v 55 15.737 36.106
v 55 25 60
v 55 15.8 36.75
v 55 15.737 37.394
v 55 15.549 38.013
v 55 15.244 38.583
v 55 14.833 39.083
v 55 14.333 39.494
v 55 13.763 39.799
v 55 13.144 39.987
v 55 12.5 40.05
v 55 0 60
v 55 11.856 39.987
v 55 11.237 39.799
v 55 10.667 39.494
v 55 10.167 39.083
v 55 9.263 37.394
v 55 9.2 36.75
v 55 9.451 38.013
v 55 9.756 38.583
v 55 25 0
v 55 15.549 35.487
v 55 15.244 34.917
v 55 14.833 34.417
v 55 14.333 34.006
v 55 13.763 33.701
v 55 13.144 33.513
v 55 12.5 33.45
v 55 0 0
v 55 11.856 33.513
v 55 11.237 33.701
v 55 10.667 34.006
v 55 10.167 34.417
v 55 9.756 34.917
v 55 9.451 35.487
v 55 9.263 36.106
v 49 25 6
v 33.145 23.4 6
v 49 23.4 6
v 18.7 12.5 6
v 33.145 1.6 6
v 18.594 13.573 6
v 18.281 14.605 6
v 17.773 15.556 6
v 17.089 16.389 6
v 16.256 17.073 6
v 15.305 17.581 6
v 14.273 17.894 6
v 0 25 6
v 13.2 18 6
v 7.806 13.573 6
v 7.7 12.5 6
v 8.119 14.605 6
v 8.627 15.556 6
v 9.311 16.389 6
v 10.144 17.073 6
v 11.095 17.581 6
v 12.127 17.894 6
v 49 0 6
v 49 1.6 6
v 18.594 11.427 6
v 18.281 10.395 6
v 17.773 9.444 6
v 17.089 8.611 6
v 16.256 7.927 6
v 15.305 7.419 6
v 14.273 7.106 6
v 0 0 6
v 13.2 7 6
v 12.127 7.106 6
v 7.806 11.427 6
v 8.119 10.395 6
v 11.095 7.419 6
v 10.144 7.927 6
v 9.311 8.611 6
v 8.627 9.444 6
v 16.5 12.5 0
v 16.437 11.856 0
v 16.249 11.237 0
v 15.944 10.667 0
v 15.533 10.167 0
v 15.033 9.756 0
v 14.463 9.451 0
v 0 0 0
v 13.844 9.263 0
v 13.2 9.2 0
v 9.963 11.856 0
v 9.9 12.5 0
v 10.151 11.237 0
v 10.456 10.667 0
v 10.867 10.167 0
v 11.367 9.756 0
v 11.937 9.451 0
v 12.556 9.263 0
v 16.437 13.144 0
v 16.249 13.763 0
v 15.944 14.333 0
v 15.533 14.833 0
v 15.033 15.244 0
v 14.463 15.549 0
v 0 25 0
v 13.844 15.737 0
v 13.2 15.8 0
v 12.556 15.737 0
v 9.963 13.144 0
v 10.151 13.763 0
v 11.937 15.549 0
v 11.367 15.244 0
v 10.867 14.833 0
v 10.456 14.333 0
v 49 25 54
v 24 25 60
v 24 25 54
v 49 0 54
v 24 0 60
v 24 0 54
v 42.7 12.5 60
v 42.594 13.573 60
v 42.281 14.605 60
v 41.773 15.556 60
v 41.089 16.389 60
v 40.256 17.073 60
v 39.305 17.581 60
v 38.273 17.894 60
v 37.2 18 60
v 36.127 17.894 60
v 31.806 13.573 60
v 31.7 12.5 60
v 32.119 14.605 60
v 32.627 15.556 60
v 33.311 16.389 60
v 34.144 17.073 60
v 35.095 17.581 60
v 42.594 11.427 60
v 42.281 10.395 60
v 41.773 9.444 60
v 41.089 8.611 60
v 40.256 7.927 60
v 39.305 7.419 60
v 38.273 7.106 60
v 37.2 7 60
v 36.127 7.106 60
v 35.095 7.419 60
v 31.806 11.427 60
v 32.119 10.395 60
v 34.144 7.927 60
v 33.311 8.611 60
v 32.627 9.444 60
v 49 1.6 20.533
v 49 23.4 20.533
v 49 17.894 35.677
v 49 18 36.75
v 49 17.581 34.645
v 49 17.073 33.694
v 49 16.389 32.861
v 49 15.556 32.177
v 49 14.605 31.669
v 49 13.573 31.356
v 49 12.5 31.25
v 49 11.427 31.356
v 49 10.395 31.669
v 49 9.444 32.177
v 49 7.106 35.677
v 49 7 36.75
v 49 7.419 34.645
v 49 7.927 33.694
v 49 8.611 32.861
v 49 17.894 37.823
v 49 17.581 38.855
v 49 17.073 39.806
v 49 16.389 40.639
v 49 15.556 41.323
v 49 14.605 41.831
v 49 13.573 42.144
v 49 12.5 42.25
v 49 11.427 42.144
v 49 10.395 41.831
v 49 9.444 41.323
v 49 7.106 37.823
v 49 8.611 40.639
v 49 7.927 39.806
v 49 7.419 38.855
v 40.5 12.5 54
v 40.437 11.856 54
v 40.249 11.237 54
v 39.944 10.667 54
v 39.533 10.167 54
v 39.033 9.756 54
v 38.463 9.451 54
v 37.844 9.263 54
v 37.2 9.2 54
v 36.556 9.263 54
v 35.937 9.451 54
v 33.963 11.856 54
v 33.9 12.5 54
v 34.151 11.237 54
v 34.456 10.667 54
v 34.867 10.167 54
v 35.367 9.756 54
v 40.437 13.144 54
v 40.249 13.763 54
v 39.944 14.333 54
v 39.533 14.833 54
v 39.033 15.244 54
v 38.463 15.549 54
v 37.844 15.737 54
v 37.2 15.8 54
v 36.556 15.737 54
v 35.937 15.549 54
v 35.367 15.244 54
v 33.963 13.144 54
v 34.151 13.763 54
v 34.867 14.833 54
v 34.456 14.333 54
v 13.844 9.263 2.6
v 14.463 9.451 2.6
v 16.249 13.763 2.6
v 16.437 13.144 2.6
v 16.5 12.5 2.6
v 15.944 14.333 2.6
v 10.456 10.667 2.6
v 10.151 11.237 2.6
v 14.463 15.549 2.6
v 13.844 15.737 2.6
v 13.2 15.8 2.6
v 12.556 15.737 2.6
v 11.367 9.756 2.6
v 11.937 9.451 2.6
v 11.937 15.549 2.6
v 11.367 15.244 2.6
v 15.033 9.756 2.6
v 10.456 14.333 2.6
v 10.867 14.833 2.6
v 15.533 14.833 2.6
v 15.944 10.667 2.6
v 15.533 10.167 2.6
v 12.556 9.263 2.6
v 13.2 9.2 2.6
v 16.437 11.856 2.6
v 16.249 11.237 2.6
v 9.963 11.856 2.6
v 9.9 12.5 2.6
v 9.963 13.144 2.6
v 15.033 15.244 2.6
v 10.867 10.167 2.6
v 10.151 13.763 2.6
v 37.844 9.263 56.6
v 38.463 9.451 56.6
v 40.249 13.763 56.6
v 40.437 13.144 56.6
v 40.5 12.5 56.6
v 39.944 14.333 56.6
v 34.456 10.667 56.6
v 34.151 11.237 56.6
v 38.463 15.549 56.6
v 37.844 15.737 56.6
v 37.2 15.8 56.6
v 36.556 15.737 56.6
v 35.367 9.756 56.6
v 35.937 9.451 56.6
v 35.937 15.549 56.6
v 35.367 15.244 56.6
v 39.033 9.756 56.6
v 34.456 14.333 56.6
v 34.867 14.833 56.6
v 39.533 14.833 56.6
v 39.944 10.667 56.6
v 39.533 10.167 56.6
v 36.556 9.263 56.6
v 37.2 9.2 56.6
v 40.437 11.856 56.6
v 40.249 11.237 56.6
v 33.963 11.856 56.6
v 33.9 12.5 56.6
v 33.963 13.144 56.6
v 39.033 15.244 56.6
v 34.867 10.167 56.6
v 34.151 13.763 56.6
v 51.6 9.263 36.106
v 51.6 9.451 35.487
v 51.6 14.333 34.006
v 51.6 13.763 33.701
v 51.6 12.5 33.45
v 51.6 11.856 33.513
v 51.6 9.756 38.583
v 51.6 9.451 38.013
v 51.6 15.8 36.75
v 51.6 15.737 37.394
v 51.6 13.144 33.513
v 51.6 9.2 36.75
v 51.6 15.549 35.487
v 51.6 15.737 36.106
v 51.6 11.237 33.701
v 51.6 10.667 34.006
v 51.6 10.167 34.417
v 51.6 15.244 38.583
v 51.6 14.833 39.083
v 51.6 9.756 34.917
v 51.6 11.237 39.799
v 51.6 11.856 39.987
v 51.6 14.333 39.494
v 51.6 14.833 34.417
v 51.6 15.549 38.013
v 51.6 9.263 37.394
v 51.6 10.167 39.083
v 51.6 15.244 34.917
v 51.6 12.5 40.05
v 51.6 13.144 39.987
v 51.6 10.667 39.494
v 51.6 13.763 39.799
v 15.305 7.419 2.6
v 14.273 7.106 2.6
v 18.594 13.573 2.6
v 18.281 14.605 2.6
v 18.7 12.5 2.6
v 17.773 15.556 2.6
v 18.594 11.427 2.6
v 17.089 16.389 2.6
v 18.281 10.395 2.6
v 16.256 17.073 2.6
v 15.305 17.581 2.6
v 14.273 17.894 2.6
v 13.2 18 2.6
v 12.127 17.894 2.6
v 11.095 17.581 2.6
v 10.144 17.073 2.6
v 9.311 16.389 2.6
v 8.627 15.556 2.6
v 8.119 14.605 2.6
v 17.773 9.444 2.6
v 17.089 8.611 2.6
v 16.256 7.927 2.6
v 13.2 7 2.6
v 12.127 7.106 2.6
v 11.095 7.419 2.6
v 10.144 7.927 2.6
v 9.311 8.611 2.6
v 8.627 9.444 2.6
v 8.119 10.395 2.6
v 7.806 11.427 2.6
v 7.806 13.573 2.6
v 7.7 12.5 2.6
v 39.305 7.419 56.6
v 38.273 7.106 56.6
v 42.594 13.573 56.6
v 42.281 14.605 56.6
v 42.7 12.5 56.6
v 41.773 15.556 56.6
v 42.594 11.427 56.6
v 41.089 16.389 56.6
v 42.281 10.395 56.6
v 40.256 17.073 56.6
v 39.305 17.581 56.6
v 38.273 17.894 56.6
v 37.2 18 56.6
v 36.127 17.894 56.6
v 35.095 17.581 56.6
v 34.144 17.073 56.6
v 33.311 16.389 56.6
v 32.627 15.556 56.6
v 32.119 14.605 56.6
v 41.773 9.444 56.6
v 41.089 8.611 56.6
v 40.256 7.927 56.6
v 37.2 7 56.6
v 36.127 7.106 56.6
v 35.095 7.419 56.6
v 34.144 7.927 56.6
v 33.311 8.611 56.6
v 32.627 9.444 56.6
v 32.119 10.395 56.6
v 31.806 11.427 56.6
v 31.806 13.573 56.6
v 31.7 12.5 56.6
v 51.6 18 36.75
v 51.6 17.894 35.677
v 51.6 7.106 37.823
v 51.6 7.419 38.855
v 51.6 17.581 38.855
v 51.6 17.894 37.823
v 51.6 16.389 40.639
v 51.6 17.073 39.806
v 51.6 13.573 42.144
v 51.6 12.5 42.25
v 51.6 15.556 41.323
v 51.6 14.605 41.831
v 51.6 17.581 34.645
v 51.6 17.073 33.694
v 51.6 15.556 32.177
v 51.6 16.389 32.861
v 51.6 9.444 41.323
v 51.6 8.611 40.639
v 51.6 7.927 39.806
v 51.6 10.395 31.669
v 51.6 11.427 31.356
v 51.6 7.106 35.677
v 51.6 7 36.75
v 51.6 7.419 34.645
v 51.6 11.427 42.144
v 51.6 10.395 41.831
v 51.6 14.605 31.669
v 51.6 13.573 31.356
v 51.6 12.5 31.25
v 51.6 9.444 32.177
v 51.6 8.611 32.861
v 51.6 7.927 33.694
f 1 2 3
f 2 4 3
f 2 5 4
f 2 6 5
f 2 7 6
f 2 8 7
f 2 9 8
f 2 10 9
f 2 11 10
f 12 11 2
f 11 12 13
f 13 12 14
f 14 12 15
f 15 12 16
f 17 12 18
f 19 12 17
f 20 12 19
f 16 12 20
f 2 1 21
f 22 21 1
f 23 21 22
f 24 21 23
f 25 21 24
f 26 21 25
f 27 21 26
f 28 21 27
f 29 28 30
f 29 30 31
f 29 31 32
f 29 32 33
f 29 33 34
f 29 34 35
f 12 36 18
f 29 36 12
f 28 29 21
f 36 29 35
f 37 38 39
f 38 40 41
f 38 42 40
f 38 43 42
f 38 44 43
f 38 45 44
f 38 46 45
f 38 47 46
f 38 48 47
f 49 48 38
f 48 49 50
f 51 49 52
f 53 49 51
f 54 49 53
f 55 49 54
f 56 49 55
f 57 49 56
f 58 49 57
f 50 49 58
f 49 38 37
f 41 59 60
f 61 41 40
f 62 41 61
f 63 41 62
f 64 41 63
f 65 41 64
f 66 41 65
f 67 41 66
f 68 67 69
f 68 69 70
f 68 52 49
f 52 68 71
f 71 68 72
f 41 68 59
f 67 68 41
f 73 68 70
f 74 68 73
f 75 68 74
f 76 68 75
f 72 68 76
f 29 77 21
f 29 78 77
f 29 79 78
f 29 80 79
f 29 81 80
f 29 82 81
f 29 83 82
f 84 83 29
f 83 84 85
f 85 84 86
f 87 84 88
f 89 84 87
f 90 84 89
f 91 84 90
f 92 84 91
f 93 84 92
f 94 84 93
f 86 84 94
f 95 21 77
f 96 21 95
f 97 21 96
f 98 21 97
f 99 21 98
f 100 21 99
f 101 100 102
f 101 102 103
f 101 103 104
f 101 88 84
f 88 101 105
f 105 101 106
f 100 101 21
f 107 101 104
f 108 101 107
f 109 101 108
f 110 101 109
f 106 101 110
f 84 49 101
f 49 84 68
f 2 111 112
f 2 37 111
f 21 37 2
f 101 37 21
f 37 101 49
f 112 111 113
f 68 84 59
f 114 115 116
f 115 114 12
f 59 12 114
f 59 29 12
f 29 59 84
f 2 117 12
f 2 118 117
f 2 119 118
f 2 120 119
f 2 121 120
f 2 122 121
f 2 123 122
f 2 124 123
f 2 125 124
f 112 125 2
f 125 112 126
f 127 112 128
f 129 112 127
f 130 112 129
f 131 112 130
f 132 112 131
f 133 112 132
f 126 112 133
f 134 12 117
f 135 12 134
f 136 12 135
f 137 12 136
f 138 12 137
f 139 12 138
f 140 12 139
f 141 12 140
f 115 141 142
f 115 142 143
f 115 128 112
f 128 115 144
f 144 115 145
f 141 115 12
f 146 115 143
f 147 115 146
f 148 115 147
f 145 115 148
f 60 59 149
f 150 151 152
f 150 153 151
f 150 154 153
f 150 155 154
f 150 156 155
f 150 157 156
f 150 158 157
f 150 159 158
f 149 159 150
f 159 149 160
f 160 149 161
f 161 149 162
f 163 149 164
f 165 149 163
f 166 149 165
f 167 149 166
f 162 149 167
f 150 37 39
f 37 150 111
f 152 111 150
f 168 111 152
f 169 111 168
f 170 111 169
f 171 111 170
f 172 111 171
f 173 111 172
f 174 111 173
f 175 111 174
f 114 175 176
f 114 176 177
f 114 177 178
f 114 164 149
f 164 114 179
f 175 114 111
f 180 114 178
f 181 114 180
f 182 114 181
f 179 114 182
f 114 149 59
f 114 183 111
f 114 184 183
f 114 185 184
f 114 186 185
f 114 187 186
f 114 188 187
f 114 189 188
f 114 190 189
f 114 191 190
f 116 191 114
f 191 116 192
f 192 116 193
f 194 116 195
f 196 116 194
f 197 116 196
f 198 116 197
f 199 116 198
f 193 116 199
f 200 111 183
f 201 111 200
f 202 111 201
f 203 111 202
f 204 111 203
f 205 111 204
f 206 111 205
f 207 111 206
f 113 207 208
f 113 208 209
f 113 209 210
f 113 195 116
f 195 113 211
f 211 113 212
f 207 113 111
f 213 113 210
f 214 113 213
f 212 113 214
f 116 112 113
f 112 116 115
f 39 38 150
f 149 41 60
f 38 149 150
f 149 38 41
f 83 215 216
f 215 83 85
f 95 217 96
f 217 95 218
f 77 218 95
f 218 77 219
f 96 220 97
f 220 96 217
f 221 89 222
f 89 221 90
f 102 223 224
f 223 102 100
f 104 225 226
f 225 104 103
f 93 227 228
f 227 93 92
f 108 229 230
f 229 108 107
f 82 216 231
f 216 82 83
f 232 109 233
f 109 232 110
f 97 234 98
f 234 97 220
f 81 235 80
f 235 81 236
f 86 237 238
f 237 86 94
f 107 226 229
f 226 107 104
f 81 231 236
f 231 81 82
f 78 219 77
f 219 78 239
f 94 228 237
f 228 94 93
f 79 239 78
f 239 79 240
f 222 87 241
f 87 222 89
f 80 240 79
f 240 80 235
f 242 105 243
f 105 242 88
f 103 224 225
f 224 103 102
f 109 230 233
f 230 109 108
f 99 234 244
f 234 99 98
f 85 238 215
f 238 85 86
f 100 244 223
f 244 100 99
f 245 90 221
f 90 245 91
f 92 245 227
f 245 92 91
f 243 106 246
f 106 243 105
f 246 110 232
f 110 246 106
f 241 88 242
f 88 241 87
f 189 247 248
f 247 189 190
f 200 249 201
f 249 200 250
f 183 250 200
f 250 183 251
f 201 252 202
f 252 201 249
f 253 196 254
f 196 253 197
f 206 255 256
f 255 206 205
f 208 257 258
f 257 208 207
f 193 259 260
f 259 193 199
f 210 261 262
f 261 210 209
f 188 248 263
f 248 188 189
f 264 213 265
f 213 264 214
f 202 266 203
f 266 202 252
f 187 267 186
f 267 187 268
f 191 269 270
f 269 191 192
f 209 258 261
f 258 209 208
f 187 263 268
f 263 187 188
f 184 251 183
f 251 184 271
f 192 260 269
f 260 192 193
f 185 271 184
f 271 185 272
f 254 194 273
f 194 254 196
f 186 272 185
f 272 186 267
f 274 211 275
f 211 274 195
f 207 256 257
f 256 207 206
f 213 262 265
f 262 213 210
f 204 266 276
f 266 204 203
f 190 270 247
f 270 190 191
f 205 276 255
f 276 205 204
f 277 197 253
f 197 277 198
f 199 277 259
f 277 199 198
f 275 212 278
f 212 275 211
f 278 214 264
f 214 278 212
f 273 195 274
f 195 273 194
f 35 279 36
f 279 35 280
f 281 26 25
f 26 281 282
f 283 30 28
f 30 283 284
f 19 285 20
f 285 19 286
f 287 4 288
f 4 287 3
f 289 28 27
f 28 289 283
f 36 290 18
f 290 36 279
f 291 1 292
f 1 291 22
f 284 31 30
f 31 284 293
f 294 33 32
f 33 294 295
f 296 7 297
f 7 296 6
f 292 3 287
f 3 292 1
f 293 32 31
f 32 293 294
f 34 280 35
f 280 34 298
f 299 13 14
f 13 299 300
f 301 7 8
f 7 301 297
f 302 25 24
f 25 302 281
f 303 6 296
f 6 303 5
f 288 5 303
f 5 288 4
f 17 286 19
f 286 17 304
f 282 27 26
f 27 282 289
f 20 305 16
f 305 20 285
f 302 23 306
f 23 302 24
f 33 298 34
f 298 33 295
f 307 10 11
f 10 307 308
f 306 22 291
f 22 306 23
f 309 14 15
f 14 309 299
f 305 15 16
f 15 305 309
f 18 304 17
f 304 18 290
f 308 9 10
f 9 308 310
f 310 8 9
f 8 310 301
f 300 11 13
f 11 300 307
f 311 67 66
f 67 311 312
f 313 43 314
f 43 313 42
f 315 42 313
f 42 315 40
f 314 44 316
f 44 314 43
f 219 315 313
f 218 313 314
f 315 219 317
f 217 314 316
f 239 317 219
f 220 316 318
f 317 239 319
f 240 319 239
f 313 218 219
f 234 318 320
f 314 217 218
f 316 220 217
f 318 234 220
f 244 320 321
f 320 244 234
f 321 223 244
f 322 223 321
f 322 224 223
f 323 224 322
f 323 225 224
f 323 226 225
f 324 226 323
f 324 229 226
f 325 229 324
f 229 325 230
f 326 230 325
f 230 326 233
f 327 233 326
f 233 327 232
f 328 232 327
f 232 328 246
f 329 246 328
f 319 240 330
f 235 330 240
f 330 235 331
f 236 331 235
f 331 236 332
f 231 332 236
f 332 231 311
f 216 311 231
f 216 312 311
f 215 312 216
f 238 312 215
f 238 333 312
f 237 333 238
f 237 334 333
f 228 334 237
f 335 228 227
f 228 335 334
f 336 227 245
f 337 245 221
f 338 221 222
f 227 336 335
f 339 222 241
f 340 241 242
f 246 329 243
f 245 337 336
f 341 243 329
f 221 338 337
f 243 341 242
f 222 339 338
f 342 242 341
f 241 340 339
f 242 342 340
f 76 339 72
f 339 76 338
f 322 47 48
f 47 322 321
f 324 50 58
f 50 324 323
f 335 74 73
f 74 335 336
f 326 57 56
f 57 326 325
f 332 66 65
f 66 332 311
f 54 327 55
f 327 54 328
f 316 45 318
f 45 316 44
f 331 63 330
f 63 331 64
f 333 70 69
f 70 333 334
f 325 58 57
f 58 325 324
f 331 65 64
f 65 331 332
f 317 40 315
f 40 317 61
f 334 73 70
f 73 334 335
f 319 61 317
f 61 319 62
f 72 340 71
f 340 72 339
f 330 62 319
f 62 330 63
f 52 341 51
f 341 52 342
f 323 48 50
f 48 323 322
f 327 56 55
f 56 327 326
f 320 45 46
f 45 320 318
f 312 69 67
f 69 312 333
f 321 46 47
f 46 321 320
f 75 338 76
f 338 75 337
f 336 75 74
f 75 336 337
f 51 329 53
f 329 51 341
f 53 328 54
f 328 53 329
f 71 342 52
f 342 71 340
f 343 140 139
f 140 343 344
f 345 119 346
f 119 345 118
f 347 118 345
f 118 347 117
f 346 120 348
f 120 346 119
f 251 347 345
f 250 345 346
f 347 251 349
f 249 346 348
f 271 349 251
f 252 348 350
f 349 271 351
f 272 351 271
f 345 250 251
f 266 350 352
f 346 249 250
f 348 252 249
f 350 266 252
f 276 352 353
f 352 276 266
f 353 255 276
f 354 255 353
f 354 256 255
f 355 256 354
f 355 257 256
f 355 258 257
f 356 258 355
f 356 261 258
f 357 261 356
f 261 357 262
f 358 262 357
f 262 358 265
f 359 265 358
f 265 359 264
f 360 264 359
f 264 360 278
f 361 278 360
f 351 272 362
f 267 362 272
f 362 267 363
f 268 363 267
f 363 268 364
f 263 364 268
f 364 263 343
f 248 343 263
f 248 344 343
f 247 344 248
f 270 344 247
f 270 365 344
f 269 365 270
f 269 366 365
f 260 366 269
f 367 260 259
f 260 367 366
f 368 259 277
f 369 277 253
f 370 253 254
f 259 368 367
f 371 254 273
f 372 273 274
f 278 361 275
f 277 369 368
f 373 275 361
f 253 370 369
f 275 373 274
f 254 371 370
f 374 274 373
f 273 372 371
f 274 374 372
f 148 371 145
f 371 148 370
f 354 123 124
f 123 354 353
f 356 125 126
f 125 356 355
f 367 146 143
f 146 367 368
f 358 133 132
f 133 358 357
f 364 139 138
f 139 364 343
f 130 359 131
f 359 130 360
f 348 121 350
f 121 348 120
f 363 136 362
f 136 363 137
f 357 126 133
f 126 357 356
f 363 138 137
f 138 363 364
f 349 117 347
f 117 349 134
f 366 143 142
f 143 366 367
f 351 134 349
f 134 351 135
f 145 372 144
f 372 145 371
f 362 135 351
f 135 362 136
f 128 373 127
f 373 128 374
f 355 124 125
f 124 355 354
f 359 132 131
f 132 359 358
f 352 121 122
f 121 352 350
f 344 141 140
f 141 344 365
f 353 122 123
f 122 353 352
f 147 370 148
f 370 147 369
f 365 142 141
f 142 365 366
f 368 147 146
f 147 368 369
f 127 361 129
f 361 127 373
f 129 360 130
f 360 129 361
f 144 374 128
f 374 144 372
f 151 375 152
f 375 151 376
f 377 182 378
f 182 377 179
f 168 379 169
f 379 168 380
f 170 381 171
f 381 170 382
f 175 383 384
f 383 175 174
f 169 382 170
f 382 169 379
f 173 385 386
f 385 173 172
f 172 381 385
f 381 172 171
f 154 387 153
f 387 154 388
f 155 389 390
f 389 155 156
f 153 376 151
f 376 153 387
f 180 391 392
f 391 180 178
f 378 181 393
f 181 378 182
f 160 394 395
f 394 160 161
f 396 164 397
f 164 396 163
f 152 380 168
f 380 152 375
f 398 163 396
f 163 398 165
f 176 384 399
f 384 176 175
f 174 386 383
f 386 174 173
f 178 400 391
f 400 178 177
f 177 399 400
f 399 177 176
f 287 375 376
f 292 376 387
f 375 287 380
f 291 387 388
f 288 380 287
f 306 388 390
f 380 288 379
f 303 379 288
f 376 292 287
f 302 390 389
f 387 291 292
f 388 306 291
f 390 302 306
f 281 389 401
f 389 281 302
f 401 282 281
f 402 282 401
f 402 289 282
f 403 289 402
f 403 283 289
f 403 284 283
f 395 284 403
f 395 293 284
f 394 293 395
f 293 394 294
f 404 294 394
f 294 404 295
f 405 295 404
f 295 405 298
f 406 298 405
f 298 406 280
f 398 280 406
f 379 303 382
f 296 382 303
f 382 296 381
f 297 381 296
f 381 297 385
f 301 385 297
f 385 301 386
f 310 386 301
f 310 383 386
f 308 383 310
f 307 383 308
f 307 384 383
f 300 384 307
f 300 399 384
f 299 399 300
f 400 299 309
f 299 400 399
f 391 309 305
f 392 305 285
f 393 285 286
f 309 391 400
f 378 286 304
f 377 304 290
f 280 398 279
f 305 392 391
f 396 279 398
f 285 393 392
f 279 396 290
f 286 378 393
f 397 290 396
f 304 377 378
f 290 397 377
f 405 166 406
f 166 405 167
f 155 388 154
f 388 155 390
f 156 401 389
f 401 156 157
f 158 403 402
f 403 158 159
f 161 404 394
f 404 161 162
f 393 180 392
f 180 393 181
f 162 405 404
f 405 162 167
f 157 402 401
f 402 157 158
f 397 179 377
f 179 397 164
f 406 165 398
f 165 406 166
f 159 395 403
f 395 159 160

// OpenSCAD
$fn = 32;

// ----------------------------------------------------------------------
// Z-bracket: 55 x 25 x 60 mm
// ----------------------------------------------------------------------

// --- parameters (mm) ---
foot_len = 55;            // lower foot length, X
top_len = 25;             // upper foot length, X
depth = 25;               // bracket width, Y
step_h = 60;              // overall rise, Z
plate_t = 6;              // plate thickness
hole_d = 6.6;             // clearance for M6
cb_d = 11;                // counterbore diameter
cb_h = 3.4;               // counterbore depth
rib_len = 17.6;           // gusset leg
rib_sink = 1.6;           // gusset overlap into the plates

module hole_z(px, py, z0) {
  translate([px, py, z0 - 2.5]) cylinder(h = plate_t + 5, d = hole_d);
}
module hole_x(py, pz) {
  translate([-2.5, py, pz]) rotate([0, 90, 0]) cylinder(h = plate_t + 5, d = hole_d);
}
module cb_z(px, py, top_z) {
  translate([px, py, top_z - cb_h]) cylinder(h = cb_h + 0.5, d = cb_d);
}
module cb_x(py, pz) {
  translate([plate_t - cb_h, py, pz]) rotate([0, -90, 0]) cylinder(h = cb_h + 0.5, d = cb_d);
}
module gusset(x0) {
  translate([x0, depth - rib_sink, 0])
    rotate([90, 0, 0])
      linear_extrude(height = depth - 2 * rib_sink)
        polygon(points = [[rib_sink, plate_t - rib_sink],
                          [rib_sink, plate_t - rib_sink + rib_len],
                          [-rib_len, plate_t - rib_sink]]);
}

difference() {
  union() {
    cube([foot_len, depth, plate_t]);
    /* web, overlapping the lower foot */
    translate([foot_len - plate_t, 0, 0]) cube([plate_t, depth, step_h]);
    /* upper foot, sunk into the web */
    translate([foot_len - plate_t - top_len, 0, step_h - plate_t]) cube([top_len + plate_t, depth, plate_t]);
    gusset(foot_len - plate_t);
  }
  hole_z(13.2, 12.5, 0);
  translate([foot_len - plate_t - 11.8, 0, 0]) hole_z(0, 12.5, step_h - plate_t);
  translate([foot_len - plate_t, 0, 0]) hole_x(12.5, 36.75);
  cb_z(13.2, 12.5, plate_t);
  translate([foot_len - plate_t - 11.8, 0, 0]) cb_z(0, 12.5, step_h);
  translate([foot_len - plate_t, 0, 0]) cb_x(12.5, 36.75);
}
